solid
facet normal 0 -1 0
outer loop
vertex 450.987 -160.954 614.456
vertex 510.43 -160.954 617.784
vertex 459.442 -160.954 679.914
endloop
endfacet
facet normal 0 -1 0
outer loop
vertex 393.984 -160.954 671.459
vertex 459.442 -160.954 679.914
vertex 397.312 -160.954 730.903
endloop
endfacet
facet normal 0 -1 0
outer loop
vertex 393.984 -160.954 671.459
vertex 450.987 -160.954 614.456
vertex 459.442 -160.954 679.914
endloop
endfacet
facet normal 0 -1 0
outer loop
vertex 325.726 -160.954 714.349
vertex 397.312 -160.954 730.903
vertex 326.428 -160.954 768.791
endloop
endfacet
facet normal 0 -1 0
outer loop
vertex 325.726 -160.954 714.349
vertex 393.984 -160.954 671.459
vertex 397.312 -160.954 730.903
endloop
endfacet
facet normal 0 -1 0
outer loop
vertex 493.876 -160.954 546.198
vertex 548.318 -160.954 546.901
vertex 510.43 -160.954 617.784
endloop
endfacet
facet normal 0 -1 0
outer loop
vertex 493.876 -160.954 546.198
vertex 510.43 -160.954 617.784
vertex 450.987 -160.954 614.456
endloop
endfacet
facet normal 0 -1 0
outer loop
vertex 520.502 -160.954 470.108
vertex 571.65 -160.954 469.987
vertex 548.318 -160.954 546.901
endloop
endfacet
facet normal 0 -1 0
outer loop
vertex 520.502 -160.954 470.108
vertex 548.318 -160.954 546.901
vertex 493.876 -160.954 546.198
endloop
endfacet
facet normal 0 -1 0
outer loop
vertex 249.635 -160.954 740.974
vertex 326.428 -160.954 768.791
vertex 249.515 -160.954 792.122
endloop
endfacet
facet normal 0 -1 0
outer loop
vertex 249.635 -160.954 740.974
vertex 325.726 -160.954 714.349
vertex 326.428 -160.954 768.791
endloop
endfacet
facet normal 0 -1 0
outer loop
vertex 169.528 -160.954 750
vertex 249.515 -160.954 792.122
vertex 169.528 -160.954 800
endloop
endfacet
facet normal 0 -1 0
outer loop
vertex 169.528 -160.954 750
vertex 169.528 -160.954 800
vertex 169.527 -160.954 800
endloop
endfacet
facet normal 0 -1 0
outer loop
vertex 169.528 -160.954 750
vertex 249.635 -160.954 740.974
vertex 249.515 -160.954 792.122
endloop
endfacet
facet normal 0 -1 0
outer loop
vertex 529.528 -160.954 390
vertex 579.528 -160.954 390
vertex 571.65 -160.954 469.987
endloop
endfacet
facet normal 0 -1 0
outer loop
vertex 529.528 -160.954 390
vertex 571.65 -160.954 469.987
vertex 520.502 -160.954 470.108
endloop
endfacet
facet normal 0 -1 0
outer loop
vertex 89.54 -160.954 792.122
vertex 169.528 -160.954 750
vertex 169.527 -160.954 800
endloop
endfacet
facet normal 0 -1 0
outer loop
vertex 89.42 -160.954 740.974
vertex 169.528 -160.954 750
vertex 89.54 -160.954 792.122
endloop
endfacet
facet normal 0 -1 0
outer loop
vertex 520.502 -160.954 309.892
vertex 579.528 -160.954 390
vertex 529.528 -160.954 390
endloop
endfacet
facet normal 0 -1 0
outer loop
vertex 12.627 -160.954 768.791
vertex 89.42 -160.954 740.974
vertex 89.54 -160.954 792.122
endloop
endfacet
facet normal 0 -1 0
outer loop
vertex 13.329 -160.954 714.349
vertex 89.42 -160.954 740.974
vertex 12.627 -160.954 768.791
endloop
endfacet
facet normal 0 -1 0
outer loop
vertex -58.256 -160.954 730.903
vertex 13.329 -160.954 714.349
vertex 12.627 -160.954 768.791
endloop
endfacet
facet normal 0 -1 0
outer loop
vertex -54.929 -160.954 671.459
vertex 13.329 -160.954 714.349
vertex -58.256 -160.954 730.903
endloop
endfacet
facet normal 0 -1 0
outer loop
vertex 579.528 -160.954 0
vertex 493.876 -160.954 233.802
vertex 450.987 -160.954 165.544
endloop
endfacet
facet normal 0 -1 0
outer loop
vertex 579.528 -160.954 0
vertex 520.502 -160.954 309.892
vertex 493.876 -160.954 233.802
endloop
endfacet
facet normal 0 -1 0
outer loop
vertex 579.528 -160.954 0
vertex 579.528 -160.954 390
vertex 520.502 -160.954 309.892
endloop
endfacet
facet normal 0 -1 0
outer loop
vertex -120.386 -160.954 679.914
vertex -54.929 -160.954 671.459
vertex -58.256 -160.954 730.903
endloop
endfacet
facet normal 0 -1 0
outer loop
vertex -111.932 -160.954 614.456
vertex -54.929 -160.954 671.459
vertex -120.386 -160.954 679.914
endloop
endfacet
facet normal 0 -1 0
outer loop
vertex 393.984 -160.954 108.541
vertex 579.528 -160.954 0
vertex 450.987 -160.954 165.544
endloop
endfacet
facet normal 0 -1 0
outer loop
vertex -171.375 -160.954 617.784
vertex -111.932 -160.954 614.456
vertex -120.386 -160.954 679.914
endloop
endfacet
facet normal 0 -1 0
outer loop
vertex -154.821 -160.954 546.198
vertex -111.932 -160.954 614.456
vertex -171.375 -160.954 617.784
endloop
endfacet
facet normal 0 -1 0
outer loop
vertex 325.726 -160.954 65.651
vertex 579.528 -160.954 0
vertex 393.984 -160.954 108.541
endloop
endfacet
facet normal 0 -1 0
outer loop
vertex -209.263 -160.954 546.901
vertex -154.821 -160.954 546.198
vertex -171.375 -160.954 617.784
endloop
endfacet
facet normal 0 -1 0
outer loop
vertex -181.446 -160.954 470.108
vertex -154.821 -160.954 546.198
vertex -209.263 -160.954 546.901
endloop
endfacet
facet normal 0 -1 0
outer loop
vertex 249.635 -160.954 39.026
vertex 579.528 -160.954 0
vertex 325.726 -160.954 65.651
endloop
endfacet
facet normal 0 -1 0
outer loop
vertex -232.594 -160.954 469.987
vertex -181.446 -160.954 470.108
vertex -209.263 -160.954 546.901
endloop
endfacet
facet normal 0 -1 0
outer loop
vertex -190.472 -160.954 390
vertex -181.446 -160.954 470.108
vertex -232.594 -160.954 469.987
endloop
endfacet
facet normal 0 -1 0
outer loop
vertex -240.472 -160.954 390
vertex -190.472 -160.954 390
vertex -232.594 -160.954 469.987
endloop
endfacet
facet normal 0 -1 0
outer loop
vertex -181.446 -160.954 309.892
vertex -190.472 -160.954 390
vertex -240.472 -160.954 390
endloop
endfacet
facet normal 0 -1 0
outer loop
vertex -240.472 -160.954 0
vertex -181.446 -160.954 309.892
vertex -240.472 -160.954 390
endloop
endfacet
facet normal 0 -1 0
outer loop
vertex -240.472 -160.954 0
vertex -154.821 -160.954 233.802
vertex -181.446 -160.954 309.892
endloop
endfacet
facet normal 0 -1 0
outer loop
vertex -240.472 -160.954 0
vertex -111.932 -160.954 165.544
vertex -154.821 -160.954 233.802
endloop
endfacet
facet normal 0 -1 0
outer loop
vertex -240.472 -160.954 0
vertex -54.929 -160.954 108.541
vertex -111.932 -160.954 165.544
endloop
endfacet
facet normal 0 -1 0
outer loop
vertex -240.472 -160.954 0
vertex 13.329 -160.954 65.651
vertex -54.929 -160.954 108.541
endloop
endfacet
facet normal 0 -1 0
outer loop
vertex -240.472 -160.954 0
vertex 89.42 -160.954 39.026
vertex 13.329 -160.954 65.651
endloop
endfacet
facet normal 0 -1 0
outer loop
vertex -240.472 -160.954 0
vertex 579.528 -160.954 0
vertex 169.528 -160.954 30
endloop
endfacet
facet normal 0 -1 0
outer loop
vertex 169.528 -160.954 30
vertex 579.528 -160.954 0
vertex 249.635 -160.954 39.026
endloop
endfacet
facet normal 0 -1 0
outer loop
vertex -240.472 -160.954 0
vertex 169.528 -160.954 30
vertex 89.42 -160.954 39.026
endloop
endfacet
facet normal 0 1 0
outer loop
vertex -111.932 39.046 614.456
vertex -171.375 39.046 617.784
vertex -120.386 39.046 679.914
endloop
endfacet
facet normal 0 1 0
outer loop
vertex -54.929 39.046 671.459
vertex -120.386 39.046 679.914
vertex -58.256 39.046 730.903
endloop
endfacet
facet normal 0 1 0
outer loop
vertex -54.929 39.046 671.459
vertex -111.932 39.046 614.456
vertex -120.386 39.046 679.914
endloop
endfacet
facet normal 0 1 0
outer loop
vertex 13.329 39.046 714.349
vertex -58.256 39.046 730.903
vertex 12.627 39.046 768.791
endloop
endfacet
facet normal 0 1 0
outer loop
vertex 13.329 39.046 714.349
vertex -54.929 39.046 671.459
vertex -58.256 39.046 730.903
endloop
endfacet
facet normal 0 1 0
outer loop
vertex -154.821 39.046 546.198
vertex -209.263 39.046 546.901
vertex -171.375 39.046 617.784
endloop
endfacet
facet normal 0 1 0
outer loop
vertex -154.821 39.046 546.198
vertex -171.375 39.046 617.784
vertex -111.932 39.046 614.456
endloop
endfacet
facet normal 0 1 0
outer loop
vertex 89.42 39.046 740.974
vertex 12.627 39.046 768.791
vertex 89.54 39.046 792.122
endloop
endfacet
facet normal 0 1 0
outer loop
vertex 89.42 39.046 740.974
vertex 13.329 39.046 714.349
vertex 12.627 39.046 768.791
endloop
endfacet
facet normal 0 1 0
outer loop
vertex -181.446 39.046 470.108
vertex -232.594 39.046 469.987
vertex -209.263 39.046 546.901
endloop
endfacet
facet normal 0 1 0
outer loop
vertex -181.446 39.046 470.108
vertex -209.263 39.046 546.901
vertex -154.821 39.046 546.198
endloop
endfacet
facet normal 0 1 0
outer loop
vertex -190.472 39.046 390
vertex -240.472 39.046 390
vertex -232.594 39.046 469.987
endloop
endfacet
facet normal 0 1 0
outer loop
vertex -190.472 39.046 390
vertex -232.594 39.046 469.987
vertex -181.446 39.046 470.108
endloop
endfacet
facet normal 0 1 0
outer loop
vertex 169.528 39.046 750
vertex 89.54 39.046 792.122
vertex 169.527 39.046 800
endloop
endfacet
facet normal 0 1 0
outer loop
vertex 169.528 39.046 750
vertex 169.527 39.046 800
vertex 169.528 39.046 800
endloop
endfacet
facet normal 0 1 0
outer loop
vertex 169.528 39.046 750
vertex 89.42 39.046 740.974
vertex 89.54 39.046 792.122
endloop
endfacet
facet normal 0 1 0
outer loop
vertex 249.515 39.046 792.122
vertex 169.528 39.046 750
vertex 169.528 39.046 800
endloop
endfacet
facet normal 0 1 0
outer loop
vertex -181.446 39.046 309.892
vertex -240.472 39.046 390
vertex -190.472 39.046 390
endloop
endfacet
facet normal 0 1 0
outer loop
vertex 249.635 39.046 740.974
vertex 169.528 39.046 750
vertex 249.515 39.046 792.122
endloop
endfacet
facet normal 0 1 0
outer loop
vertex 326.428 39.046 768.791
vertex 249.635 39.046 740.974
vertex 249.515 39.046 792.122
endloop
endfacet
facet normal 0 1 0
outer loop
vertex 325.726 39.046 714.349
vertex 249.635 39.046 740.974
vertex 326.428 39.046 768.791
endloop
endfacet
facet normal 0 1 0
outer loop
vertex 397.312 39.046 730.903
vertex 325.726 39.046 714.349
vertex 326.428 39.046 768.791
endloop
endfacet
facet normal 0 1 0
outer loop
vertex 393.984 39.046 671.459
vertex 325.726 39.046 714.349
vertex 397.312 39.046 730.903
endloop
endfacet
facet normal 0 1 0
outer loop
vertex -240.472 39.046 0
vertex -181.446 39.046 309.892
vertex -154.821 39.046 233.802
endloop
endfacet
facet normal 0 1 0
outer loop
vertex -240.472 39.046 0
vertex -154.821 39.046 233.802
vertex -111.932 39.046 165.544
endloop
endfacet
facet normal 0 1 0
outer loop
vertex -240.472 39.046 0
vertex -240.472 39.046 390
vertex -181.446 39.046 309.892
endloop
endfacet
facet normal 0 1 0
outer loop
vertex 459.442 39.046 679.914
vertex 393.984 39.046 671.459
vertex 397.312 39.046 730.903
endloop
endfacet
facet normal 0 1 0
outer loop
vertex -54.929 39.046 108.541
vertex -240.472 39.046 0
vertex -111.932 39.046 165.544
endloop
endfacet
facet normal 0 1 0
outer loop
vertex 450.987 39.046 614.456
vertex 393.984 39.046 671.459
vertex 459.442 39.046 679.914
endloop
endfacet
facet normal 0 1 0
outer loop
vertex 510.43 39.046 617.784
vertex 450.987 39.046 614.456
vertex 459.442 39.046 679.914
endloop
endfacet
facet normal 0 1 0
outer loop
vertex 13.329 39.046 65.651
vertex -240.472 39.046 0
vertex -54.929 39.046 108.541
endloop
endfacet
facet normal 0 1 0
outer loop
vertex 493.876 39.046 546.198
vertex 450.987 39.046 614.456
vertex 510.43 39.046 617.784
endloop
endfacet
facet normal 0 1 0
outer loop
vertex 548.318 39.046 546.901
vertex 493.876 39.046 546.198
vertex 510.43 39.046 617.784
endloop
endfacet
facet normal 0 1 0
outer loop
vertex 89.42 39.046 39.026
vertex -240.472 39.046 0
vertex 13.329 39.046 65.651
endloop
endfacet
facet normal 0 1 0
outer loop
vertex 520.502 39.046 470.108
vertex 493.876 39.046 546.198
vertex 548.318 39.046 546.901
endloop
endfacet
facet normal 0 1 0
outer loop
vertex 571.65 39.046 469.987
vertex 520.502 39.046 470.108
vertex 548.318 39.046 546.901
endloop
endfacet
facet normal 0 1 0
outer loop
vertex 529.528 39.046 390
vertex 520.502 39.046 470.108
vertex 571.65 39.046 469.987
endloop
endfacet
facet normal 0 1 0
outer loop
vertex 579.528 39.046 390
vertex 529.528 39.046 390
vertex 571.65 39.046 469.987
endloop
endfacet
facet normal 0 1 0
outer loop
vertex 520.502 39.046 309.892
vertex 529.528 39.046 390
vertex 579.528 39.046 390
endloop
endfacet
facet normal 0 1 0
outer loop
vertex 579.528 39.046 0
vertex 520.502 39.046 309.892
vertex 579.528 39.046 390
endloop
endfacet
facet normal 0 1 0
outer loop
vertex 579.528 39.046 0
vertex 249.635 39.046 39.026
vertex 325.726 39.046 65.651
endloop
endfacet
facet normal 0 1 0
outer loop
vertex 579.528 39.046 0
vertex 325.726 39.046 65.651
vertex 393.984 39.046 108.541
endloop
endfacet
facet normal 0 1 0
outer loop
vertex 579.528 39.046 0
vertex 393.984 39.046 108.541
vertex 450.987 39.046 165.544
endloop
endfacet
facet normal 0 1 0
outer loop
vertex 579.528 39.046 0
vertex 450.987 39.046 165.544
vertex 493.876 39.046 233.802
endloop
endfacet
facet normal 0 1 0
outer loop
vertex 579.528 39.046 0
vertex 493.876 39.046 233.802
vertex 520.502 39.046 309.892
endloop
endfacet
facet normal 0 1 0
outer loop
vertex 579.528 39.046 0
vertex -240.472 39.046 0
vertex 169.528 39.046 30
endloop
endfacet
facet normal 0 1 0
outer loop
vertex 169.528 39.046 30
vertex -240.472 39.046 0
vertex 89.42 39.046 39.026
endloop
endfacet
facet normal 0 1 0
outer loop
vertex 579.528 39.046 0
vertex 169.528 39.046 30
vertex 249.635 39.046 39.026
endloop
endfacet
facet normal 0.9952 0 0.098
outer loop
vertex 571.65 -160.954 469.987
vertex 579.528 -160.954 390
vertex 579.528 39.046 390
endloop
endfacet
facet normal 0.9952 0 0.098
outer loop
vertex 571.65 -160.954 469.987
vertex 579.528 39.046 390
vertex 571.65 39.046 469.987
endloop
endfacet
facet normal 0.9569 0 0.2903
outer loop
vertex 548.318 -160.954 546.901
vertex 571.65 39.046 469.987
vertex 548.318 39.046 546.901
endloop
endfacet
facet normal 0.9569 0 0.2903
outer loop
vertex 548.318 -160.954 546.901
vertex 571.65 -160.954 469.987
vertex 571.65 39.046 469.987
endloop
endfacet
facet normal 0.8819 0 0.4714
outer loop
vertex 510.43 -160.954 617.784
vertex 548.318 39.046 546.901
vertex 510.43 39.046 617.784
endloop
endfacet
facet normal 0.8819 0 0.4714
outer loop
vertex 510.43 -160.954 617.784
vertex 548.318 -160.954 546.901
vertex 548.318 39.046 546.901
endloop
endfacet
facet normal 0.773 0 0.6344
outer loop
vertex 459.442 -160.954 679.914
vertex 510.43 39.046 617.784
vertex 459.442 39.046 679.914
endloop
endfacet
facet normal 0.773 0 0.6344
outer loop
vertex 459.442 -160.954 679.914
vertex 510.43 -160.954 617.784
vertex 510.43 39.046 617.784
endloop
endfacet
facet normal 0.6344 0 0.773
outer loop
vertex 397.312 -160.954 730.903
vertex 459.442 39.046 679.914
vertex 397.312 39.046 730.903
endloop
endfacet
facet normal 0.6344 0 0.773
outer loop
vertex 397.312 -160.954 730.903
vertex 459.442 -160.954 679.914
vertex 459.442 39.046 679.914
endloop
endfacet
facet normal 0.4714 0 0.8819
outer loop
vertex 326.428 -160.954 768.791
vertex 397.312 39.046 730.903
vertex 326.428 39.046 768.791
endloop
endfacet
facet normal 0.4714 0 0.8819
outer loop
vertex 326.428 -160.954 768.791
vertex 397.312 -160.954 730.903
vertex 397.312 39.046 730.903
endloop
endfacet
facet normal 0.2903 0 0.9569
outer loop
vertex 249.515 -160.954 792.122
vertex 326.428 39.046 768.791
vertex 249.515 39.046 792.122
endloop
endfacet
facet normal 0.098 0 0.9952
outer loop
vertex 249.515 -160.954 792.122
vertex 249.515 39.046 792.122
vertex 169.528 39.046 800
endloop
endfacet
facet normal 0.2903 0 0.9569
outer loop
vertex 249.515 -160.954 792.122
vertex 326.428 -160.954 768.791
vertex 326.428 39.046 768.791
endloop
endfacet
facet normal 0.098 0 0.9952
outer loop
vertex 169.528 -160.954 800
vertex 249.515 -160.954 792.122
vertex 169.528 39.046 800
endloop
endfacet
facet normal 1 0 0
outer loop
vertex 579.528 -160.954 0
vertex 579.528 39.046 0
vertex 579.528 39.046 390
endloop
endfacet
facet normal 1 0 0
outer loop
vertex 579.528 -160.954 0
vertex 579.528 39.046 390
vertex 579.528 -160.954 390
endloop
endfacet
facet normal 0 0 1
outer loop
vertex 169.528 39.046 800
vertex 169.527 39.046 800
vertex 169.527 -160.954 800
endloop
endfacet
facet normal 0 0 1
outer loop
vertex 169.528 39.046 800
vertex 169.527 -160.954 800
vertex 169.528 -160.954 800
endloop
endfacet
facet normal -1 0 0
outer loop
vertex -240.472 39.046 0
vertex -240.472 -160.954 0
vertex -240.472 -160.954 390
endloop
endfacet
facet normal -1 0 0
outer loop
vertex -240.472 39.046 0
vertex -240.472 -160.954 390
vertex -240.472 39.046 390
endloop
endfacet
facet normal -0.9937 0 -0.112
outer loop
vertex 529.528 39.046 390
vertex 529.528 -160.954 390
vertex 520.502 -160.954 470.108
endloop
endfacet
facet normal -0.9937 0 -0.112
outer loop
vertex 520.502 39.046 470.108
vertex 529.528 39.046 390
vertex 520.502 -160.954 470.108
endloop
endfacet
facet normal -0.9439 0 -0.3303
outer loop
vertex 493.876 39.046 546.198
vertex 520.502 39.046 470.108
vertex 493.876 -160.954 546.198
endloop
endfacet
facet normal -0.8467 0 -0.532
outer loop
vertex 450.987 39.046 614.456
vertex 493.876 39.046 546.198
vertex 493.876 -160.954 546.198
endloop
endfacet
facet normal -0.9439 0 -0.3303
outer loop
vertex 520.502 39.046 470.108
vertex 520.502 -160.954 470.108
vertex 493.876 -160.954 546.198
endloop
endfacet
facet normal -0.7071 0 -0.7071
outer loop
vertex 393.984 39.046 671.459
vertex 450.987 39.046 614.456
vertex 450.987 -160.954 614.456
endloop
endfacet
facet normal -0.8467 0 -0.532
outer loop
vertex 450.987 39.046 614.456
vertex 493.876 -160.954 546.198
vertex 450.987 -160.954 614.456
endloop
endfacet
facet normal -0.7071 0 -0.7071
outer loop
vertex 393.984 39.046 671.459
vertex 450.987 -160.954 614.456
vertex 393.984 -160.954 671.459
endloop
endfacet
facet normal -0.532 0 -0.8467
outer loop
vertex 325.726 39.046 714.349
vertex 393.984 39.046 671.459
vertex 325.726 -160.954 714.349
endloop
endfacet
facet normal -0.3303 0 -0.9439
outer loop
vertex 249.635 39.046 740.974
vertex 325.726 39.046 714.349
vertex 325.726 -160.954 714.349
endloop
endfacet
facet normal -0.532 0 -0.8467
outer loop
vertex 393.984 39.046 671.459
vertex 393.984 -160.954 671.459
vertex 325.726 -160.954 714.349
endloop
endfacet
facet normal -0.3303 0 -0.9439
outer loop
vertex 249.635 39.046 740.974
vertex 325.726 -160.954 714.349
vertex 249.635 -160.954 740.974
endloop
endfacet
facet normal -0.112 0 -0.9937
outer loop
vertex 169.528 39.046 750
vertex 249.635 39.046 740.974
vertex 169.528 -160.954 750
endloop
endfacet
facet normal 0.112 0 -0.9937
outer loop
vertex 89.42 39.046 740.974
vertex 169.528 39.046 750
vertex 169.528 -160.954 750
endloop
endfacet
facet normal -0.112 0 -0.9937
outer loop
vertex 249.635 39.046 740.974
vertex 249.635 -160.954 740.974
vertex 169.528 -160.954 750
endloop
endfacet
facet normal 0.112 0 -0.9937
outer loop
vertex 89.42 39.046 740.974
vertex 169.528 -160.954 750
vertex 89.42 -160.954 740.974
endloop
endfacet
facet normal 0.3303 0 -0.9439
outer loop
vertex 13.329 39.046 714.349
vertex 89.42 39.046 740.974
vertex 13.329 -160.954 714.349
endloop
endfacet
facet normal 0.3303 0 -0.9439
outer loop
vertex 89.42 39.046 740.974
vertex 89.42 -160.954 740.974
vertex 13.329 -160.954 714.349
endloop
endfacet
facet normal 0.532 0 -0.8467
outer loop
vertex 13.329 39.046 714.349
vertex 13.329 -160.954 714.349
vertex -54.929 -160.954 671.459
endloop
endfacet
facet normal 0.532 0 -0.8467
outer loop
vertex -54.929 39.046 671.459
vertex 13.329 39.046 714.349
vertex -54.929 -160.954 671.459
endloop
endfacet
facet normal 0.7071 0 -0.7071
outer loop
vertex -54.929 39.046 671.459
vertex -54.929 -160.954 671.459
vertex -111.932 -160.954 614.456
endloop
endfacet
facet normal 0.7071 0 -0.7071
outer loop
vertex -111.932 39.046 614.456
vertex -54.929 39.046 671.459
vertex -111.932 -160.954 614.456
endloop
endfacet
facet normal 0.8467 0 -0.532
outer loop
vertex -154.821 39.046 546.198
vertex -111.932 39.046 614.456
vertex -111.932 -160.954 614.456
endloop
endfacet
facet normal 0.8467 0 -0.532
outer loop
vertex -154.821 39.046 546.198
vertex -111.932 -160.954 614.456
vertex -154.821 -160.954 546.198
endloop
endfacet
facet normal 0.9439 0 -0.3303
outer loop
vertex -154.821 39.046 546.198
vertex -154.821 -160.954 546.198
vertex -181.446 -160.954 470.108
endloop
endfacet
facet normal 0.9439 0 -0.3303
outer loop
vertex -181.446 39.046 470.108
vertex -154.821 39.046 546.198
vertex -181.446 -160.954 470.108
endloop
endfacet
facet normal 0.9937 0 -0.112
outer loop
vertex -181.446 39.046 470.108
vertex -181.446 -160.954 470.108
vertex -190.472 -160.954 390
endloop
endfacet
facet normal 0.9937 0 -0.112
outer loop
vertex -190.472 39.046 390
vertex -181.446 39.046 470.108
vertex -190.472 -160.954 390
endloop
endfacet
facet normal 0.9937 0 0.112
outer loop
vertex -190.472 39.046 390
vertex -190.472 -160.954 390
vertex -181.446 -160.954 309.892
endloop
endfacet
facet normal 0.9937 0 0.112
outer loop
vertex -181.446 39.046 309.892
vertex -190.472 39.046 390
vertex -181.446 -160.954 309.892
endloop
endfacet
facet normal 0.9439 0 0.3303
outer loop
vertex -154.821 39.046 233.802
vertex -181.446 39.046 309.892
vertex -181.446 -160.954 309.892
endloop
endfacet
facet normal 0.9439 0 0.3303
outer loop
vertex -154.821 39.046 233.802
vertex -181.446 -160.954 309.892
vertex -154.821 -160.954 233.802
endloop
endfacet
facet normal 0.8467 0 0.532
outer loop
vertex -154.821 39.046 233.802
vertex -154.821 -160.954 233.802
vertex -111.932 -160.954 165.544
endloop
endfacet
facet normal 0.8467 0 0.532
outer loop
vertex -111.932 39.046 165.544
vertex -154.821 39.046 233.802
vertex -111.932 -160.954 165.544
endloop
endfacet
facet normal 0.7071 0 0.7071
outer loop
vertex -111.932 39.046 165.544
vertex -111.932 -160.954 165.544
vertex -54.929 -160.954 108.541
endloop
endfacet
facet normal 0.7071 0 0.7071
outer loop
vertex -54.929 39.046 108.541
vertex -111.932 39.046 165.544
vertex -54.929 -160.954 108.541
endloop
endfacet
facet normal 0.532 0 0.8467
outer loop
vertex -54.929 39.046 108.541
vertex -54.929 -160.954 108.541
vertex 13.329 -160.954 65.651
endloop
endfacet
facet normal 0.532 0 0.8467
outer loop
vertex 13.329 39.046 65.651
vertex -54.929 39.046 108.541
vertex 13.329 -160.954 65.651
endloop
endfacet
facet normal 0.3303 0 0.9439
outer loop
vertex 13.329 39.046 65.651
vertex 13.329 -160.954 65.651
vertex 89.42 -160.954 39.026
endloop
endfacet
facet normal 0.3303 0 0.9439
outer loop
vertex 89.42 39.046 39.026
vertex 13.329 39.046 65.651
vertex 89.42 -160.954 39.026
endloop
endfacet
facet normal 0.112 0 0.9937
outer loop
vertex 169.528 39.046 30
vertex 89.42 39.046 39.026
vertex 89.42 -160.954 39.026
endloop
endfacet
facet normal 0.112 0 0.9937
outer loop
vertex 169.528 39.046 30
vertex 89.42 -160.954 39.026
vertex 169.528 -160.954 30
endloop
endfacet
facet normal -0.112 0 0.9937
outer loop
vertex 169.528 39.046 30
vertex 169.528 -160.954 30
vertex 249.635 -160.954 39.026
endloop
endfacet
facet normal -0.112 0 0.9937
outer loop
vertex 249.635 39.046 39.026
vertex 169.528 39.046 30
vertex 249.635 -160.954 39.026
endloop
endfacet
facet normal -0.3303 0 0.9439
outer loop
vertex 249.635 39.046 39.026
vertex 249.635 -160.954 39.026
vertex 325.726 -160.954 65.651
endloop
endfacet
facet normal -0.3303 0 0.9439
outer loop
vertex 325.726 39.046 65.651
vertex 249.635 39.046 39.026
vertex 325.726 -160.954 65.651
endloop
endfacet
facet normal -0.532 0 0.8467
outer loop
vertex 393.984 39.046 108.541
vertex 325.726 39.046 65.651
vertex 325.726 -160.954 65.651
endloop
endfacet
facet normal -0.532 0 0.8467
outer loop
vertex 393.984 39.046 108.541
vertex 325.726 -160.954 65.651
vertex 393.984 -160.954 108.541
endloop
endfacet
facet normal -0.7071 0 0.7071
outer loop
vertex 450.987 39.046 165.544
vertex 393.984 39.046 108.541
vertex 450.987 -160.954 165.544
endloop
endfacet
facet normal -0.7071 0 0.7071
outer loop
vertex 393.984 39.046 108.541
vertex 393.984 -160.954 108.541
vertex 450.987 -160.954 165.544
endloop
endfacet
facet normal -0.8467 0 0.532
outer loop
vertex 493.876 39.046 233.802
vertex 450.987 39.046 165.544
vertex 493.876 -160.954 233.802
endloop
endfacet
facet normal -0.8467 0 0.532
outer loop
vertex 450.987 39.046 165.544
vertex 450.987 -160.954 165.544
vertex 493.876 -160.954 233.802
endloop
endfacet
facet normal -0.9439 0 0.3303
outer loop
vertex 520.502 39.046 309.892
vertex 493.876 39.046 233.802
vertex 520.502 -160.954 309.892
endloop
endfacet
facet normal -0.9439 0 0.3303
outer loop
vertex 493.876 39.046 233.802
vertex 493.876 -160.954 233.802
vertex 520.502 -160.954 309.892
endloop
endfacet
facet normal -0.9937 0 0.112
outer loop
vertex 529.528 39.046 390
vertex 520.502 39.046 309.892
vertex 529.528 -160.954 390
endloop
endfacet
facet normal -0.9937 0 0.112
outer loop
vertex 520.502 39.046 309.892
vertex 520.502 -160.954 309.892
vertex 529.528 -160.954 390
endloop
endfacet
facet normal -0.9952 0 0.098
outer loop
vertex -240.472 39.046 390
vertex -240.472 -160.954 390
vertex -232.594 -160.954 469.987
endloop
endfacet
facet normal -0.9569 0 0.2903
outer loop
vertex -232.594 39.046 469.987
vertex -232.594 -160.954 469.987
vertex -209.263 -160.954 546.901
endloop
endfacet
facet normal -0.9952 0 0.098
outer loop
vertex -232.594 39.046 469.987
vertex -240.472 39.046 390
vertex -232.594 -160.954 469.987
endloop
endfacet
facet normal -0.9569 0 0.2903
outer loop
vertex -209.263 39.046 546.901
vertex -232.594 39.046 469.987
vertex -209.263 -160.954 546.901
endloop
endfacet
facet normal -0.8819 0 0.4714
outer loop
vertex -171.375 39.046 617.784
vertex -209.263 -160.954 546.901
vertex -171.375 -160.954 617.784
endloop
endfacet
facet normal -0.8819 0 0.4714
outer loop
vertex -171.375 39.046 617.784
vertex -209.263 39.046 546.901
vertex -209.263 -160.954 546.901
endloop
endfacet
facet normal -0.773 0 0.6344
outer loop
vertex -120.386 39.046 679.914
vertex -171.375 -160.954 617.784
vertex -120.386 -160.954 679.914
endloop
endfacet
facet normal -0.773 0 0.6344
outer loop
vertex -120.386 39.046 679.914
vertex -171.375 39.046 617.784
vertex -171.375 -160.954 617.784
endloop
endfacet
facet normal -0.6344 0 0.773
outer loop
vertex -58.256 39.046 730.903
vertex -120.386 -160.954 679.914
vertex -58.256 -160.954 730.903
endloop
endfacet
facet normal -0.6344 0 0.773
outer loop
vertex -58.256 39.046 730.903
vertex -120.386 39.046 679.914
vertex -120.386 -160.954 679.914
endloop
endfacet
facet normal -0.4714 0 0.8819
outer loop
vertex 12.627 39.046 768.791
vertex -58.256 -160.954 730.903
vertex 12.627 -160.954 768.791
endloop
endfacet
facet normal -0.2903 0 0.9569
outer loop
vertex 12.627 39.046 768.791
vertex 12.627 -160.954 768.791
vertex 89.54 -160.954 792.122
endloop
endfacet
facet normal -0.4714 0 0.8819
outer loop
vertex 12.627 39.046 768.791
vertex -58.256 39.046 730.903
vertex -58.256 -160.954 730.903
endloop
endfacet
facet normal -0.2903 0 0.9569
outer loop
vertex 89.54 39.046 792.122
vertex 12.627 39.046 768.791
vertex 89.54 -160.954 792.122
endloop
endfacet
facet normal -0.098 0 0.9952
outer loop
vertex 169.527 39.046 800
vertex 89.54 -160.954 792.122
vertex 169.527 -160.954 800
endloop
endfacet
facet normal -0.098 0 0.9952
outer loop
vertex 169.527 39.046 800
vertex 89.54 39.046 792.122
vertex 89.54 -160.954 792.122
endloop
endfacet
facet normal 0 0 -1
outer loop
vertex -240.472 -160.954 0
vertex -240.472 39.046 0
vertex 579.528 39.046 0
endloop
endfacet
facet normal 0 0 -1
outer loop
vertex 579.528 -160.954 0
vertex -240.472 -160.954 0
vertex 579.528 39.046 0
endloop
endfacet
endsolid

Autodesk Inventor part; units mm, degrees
ref_plane "YZ Plane" through (0, 0, 0) normal (1, 0, 0) x (0, 1, 0)
ref_plane "XZ Plane" through (0, 0, 0) normal (0, 1, 0) x (-1, 0, 0)
ref_plane "XY Plane" through (0, 0, 0) normal (0, 0, 1) x (1, 0, 0)
sketch "Skizze1" plane through (0, 0, 0) normal (0, 0, 1) x (1, 0, 0)
  line L0 (-240.4724, 39.0464) -> (579.5276, 39.0464)
  line L1 (579.5276, 39.0464) -> (579.5276, -160.9536)
  line L2 (579.5276, -160.9536) -> (-240.4724, -160.9536)
  line L3 (-240.4724, -160.9536) -> (-240.4724, 39.0464)
  point P0 (0, 0)
  dimension "d0" = 200
  dimension "d1" = 820
extrude "Extrusion1" add sketch "Skizze1" along normal blind 800
fillet "Rundung1" radius 410 2 edges at (-240.4724, -60.9536, 800) (579.5276, -60.9536, 800)
sketch "Skizze2" plane through (-240.4724, -160.9536, 0) normal (0, -1, 0) x (1, 0, 0)
  circle A0 centre (410, 390) radius 360
  line L0 (820, 0) -> (820, 390) projected
  line L1 (0, 0) -> (820, 0) projected
  point P0 (240.4724, 0)
  dimension "d5" = 720
  dimension "d6" = 410
  dimension "d7" = 390
extrude "Extrusion2" cut sketch "Skizze2" against normal up to surface (200 mm away)
properties part number "XPS-Hinten"
